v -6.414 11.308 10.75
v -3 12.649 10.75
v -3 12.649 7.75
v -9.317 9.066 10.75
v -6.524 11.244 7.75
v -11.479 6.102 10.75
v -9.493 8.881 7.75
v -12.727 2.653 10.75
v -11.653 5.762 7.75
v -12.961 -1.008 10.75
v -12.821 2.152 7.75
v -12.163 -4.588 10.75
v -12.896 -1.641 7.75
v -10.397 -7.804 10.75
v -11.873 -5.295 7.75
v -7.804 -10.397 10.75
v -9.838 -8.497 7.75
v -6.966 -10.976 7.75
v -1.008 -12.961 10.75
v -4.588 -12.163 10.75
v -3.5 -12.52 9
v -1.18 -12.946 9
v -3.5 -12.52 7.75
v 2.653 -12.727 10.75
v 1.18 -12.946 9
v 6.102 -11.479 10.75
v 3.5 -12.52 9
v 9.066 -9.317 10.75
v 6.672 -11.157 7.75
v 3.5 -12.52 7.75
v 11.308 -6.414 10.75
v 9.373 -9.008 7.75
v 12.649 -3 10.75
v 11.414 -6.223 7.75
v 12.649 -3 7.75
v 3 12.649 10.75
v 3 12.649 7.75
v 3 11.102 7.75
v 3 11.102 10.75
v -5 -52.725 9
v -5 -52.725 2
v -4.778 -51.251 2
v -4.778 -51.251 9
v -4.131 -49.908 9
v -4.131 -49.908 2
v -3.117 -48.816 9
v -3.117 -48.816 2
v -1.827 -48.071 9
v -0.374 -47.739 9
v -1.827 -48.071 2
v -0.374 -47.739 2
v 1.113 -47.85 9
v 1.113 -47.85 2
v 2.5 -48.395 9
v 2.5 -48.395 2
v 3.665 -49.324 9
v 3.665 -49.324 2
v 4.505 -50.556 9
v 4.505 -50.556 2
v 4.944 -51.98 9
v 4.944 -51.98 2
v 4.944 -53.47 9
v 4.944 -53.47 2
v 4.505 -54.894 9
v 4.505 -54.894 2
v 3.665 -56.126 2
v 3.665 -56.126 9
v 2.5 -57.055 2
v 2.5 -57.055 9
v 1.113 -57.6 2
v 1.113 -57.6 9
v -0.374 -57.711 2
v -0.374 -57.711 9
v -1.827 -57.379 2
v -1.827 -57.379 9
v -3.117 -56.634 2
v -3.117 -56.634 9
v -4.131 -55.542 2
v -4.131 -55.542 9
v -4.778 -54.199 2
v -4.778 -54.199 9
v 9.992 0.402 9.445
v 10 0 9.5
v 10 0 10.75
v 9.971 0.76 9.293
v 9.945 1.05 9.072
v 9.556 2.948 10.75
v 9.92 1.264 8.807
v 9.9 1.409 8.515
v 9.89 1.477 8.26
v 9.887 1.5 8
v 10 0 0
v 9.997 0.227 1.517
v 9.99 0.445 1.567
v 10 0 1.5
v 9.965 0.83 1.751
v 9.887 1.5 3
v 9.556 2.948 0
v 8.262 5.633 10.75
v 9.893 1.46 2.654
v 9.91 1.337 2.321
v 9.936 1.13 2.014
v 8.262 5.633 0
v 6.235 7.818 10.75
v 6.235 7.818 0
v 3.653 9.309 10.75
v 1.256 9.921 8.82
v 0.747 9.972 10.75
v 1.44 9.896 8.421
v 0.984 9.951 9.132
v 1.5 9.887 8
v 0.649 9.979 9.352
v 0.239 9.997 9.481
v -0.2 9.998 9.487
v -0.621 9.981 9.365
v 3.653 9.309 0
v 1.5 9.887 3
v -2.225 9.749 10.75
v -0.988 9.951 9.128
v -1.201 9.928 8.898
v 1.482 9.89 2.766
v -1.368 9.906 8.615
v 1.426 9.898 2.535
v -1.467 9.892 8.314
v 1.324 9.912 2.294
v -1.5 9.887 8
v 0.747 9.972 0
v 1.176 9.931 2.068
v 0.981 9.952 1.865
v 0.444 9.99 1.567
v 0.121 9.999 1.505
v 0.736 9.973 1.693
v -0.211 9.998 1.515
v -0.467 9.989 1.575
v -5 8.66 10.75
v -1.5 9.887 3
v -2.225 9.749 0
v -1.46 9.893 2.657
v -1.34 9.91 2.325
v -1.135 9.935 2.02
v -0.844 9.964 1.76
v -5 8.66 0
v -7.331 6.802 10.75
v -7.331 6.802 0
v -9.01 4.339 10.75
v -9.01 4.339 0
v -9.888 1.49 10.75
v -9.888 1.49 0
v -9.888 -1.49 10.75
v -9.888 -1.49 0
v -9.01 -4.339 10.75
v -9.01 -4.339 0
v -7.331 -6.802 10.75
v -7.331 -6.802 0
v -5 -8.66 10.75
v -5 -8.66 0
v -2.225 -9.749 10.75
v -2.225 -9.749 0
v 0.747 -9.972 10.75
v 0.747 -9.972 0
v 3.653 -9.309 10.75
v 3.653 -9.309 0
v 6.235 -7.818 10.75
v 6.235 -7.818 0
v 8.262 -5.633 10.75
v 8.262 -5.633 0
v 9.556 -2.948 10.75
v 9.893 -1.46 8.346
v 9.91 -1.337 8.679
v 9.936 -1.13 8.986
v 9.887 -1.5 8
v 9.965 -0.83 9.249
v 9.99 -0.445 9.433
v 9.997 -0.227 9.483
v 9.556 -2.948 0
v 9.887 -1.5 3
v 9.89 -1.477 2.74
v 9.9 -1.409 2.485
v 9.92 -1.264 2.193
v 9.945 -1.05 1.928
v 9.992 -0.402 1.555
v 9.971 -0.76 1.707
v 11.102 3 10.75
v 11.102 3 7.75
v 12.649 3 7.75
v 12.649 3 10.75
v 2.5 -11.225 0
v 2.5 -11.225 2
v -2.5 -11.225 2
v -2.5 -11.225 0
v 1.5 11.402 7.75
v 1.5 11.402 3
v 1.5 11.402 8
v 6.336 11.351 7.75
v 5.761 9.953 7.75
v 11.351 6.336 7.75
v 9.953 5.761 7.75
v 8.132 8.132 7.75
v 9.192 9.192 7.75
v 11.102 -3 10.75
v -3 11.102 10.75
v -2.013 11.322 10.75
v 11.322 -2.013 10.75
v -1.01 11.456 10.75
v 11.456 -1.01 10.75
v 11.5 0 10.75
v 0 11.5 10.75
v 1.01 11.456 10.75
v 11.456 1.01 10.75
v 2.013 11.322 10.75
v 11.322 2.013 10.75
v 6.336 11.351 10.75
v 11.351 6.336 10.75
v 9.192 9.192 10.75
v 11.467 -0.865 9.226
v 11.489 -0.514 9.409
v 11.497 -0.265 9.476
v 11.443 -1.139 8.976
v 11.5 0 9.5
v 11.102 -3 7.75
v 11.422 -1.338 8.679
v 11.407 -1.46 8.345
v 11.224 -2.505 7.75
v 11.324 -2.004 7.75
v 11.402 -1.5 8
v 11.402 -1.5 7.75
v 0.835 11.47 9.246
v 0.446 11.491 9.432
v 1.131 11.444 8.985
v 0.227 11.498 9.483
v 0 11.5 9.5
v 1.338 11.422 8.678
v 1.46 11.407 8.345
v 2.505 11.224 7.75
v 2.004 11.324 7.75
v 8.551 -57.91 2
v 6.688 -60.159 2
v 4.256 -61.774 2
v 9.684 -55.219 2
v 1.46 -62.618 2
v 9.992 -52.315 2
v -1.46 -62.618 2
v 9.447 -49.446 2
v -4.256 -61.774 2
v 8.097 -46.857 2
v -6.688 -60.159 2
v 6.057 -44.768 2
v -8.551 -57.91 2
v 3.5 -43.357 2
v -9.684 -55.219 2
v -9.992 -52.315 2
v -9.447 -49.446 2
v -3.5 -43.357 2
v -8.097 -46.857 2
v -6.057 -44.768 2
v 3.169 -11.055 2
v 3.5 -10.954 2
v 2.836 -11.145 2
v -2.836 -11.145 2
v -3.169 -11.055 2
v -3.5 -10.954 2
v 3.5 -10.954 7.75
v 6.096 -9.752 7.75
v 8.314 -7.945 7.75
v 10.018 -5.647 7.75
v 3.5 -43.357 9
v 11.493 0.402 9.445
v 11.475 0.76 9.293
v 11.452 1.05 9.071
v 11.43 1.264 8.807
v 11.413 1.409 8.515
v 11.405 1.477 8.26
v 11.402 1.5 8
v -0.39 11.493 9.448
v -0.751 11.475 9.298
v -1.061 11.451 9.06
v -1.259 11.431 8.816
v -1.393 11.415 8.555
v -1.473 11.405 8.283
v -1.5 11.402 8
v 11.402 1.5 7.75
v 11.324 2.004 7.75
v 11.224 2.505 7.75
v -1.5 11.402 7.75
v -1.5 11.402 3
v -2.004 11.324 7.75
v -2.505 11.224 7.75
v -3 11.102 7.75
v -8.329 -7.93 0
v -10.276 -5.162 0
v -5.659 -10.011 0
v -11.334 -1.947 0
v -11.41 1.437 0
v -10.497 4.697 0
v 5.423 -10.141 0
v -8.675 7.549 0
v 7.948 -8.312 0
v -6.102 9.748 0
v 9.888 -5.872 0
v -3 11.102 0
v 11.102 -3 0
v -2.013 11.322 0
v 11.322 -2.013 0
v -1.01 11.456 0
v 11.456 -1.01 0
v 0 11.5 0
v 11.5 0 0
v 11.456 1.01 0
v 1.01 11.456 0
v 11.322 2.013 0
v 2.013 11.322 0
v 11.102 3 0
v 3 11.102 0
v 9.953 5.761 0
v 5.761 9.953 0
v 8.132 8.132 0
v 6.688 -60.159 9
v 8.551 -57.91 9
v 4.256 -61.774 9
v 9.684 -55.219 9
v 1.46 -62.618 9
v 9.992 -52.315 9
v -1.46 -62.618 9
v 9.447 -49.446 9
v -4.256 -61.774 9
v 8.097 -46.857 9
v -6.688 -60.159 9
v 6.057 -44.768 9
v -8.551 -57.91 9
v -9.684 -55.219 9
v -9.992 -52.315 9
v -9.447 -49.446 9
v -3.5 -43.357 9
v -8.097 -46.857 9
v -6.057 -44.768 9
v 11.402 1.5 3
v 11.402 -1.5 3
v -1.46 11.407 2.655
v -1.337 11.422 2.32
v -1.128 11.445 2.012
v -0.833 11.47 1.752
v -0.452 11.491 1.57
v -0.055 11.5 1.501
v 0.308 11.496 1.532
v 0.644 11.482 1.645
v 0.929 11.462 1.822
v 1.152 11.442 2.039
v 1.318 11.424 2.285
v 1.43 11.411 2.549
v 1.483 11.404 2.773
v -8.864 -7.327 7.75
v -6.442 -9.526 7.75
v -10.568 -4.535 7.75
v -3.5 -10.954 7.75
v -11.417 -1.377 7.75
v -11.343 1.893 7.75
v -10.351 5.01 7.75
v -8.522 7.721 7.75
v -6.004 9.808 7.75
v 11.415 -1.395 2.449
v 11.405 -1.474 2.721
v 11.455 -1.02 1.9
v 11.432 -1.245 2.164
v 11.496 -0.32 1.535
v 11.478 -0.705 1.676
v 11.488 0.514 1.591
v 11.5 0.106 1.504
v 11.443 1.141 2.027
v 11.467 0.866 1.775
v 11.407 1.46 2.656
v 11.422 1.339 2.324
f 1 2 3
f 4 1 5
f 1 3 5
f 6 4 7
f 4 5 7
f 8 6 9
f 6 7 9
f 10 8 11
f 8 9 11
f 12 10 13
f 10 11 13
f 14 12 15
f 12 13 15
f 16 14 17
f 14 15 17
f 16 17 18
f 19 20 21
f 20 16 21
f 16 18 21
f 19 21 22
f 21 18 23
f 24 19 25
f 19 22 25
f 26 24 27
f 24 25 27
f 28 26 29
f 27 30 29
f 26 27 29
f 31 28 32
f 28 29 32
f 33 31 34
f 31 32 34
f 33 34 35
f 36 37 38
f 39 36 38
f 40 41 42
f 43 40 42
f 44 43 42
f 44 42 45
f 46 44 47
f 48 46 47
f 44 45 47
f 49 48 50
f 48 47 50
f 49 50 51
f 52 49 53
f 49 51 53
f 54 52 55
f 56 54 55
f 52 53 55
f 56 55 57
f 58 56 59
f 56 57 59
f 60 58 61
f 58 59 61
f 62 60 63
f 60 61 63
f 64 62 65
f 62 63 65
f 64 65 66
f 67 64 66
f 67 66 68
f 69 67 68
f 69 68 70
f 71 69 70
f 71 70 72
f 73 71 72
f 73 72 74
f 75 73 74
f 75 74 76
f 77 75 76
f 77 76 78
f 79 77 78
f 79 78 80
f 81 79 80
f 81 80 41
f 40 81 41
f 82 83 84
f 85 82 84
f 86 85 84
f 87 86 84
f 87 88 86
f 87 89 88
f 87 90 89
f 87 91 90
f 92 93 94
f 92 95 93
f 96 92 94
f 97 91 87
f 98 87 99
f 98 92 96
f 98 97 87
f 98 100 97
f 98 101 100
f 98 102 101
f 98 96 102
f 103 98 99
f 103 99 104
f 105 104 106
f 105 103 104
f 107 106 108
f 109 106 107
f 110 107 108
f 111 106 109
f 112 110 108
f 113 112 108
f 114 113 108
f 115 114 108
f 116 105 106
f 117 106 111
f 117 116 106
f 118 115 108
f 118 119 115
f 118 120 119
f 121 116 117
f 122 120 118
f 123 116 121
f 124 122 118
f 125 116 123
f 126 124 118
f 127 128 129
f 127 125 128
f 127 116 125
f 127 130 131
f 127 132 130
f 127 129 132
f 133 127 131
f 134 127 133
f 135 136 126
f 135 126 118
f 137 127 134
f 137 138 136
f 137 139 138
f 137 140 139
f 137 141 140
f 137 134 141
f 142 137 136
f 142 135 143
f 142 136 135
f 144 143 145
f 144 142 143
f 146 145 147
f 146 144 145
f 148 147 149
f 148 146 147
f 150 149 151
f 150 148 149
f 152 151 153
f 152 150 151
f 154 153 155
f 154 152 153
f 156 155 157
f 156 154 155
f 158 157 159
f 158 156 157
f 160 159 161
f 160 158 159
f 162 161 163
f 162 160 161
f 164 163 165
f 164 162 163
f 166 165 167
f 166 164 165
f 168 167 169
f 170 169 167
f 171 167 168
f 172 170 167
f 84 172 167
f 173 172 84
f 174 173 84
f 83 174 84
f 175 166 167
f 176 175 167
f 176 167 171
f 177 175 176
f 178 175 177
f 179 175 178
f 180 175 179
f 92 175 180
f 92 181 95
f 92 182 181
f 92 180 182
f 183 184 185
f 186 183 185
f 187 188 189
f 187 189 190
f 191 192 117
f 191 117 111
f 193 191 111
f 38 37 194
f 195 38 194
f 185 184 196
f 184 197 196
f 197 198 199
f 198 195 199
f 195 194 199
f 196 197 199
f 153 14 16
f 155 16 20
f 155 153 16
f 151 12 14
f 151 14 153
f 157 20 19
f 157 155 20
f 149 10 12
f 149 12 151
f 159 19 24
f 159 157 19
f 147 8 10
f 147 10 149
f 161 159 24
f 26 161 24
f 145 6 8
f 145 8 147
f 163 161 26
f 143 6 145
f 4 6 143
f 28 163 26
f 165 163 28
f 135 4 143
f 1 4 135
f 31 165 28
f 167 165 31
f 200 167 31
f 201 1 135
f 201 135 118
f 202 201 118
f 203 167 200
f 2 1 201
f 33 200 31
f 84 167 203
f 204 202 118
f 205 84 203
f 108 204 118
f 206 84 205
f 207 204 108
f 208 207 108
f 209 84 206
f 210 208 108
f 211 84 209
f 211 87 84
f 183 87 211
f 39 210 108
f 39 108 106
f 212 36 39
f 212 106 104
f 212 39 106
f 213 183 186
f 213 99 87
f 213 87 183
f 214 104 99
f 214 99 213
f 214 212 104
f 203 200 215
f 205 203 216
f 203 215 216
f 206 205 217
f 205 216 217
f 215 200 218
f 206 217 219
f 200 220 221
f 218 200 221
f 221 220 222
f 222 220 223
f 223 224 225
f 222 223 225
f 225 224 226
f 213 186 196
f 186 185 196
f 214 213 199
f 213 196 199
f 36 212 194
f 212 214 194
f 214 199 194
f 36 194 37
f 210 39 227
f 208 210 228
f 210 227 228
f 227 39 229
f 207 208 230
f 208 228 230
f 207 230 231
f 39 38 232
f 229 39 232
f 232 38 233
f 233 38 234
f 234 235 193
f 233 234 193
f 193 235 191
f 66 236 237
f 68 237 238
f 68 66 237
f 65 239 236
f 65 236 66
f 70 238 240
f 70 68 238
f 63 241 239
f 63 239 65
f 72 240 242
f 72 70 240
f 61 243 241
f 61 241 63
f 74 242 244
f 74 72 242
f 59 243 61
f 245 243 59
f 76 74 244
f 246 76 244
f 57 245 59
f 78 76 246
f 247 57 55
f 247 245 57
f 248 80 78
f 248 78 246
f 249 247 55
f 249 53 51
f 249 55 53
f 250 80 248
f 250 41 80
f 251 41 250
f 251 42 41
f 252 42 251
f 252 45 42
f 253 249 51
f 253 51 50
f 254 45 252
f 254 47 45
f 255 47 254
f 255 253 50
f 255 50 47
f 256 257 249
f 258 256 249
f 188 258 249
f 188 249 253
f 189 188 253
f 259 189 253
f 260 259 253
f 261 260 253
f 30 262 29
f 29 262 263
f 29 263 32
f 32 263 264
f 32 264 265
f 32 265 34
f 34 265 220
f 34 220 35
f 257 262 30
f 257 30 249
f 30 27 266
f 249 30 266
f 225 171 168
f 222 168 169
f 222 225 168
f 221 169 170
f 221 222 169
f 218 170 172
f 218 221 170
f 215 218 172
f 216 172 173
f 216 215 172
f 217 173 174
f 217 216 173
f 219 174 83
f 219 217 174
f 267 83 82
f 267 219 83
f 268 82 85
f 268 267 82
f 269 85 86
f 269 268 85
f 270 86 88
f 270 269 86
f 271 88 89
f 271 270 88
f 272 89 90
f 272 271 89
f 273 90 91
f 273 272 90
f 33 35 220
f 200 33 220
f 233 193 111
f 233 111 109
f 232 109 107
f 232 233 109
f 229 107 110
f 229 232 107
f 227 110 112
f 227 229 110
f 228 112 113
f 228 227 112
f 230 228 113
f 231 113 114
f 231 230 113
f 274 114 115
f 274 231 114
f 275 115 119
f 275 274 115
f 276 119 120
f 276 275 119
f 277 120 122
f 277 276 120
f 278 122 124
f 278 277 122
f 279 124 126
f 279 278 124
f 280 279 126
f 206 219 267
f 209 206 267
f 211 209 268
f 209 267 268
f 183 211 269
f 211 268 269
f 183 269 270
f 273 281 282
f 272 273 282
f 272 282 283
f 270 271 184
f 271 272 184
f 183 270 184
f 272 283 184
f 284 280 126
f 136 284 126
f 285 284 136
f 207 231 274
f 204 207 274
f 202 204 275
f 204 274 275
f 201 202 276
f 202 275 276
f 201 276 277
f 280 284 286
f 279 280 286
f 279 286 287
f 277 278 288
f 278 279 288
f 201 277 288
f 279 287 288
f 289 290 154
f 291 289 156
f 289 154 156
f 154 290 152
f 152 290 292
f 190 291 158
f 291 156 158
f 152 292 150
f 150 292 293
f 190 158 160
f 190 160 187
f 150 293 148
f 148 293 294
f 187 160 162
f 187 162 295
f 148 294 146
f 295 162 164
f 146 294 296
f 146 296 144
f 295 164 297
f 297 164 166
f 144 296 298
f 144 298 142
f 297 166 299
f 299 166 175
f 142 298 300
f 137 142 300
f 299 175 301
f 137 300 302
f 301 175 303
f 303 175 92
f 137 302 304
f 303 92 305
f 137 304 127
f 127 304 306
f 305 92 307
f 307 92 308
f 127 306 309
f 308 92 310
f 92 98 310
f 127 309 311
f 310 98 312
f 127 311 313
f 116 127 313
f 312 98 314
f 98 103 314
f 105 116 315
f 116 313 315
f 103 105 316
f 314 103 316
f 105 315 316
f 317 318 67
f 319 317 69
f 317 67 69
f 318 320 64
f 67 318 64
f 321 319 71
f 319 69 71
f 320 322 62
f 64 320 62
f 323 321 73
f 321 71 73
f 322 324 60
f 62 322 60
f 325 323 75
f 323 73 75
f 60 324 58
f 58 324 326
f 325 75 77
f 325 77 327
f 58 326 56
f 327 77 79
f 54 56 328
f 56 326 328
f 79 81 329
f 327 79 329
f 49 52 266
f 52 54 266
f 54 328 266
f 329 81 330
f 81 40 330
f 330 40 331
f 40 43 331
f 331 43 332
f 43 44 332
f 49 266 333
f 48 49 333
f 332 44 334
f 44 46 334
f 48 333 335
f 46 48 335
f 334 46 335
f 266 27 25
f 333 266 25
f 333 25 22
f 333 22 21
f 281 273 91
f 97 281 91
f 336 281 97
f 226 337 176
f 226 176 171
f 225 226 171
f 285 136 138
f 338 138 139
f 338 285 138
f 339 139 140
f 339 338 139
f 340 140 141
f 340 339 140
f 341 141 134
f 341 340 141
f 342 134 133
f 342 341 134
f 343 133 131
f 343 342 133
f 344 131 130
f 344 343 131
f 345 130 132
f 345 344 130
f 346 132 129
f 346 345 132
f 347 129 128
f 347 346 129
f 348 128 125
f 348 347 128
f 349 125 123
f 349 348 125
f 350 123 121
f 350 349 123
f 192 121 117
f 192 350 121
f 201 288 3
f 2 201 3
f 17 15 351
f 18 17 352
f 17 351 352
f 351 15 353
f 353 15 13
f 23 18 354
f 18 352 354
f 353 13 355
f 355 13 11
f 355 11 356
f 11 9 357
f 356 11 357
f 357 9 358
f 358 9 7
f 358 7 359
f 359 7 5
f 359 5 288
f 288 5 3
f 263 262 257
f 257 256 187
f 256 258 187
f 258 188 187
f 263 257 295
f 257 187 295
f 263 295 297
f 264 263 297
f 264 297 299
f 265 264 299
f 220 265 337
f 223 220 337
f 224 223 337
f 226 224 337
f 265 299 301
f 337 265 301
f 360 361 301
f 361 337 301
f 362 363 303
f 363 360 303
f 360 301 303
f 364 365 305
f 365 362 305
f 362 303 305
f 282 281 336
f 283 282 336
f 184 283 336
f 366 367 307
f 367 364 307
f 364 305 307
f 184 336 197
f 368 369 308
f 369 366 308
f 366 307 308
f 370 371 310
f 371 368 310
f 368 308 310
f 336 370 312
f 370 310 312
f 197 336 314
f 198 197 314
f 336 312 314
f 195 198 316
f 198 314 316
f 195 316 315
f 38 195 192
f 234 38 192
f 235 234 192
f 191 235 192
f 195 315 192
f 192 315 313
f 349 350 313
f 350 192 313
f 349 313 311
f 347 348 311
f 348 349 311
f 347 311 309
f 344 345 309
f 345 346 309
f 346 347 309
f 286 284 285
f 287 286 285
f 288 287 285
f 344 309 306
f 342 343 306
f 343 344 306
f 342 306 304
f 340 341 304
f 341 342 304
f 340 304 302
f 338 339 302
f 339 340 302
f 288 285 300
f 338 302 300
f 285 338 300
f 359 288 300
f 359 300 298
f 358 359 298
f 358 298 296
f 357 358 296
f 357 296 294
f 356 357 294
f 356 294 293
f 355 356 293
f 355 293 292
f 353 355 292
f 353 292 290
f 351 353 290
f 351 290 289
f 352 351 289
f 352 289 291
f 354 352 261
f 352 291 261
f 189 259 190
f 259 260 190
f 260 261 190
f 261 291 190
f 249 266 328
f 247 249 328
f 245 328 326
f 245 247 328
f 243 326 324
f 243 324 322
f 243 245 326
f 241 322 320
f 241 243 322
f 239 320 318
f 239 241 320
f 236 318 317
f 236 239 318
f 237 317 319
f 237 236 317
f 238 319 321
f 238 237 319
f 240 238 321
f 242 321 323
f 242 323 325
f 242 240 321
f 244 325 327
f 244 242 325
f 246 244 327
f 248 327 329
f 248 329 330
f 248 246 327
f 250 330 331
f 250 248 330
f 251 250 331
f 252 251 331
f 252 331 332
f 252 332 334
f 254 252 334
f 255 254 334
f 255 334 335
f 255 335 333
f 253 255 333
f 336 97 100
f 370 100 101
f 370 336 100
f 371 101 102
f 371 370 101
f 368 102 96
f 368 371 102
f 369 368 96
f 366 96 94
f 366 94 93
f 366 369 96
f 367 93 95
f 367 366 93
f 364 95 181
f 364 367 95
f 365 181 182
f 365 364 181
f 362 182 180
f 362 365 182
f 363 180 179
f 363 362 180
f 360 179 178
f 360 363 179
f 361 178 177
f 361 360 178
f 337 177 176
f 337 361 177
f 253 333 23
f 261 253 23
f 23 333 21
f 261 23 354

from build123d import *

# Parameters (mm, degrees)
CROQUIS1_R               = 10
SALIENTE_EXTRUIR1_DEPTH  = 3
CROQUIS2_R               = 11.5
CROQUIS2_R_2             = 10
SALIENTE_EXTRUIR3_DEPTH  = 8
SALIENTE_EXTRUIR4_START  = 3
CROQUIS3_R               = 11.5
CROQUIS3_R_2             = 10
SALIENTE_EXTRUIR4_DEPTH  = 3
CORTAR_EXTRUIR1_DEPTH    = 8
SALIENTE_EXTRUIR5_DEPTH  = 8
CORTAR_EXTRUIR2_DEPTH    = 8
CROQUIS11_W              = 0.560243
CROQUIS11_H              = 6
CORTAR_EXTRUIR3_DEPTH    = 8
CROQUIS12_W              = 2.5
CROQUIS12_H              = 0.622045
SALIENTE_EXTRUIR6_DEPTH  = 3
CROQUIS13_W              = 5
CROQUIS13_H              = 50.275028
SALIENTE_EXTRUIR7_DEPTH  = 8
CROQUIS15_W              = 2
CROQUIS15_H              = 50.275028
CORTAR_EXTRUIR4_DEPTH    = 8
SALIENTE_EXTRUIR8_DEPTH  = 7
CROQUIS21_R              = 10
SALIENTE_EXTRUIR9_DEPTH  = 7
CROQUIS22_R              = 5
CORTAR_EXTRUIR5_DEPTH    = 30
CROQUIS23_R              = 10
SALIENTE_EXTRUIR10_DEPTH = 1.25
CORTAR_EXTRUIR6_START    = -1.5
CROQUIS24_R              = 10
CORTAR_EXTRUIR6_DEPTH    = 1.5
SALIENTE_EXTRUIR11_START = -3
CROQUIS25_R              = 13
SALIENTE_EXTRUIR11_DEPTH = 3
CORTAR_EXTRUIR10_DEPTH   = 13
CORTAR_EXTRUIR11_DEPTH   = 13
CORTAR_EXTRUIR14_START   = -10
CROQUIS30_R              = 10
CORTAR_EXTRUIR14_DEPTH   = 10


with BuildPart() as part:
    # Croquis1 → Saliente-Extruir1 (new body)
    with BuildSketch(Plane.XY):
        Circle(CROQUIS1_R)
    extrude(amount=SALIENTE_EXTRUIR1_DEPTH)



with BuildPart() as body_2:
    # Croquis2 → Saliente-Extruir3 (new body)
    with BuildSketch(Plane.XY.offset(3)):
        Circle(CROQUIS2_R)
        Circle(CROQUIS2_R_2, mode=Mode.SUBTRACT)
    extrude(amount=SALIENTE_EXTRUIR3_DEPTH)


with BuildPart() as part_1:
    add(part.part)

    add(body_2.part)  # Saliente-Extruir4 merges body 2
    # Croquis3 → Saliente-Extruir4 (add)
    with BuildSketch(Plane(origin=(0, 0, 3), x_dir=(-1, 0, 0), z_dir=(0, 0, -1)).offset(SALIENTE_EXTRUIR4_START)):
        with Locations(Location((0, 0, 0), (0, 0, 180))):
            Circle(CROQUIS3_R)
        with Locations(Location((0, 0, 0), (0, 0, 180))):
            Circle(CROQUIS3_R_2, mode=Mode.SUBTRACT)
    extrude(amount=-SALIENTE_EXTRUIR4_DEPTH)

    # Croquis4 → Cortar-Extruir1 (cut)
    with BuildSketch(Plane(origin=(0, 11.5, 0), x_dir=(1, 0, 0), z_dir=(0, 1, 0))):
        with BuildLine():
            Line((-1.5, -8), (-1.5, -3))
            ThreePointArc((-1.5, -3), (0, -1.5), (1.5, -3))
            Line((1.5, -3), (1.5, -8))
            ThreePointArc((1.5, -8), (0, -9.5), (-1.5, -8))
        make_face()
    extrude(amount=-CORTAR_EXTRUIR1_DEPTH, mode=Mode.SUBTRACT)


with BuildPart() as body_2_2:
    # Croquis9 → Saliente-Extruir5 (new body)
    with BuildSketch(Plane.XY.offset(11)):
        Polygon((11.5, 0), (11.5, 3), (12.060243, 3), (12.060243, -3), (11.5, -3), align=None)
    extrude(amount=-SALIENTE_EXTRUIR5_DEPTH)


with BuildPart() as cortar_extruir2_tool:
    # Croquis10 → Cortar-Extruir2 (new body)
    with BuildSketch(Plane(origin=(12.060243, 0, 0), x_dir=(0, 0, -1), z_dir=(1, 0, 0))):
        with BuildLine():
            Line((-3, -1.5), (-8, -1.5))
            ThreePointArc((-8, -1.5), (-9.5, 0), (-8, 1.5))
            Line((-8, 1.5), (-3, 1.5))
            ThreePointArc((-3, 1.5), (-1.5, 0), (-3, -1.5))
        make_face()
    extrude(amount=-CORTAR_EXTRUIR2_DEPTH)


with BuildPart() as part_2:
    add(part_1.part)

    # Cortar-Extruir2: cut by cortar_extruir2_tool
    add(cortar_extruir2_tool.part, mode=Mode.SUBTRACT)

    # Croquis12 → Saliente-Extruir6 (add)
    with BuildSketch(Plane.XY.offset(3)):
        with Locations((-1.25, -11.188978)):
            Rectangle(CROQUIS12_W, CROQUIS12_H)
        with Locations((1.25, -11.188978)):
            Rectangle(CROQUIS12_W, CROQUIS12_H)
        Polygon((2.5, -11.5), (2.5, -61.5), (-2.5, -61.5), (-2.5, -11.5), (0, -11.5), align=None)
    extrude(amount=-SALIENTE_EXTRUIR6_DEPTH)

    # Croquis13 → Saliente-Extruir7 (add)
    with BuildSketch(Plane.XY.offset(3)):
        with Locations((0, -36.362486)):
            Rectangle(CROQUIS13_W, CROQUIS13_H)
    extrude(amount=SALIENTE_EXTRUIR7_DEPTH)

    # Croquis15 → Cortar-Extruir4 (cut)
    with BuildSketch(Plane(origin=(2.5, 0, 0), x_dir=(0, 0, -1), z_dir=(1, 0, 0))):
        with Locations((-10, -36.362486)):
            Rectangle(CROQUIS15_W, CROQUIS15_H)
        with Locations((-1, -36.362486)):
            Rectangle(CROQUIS15_W, CROQUIS15_H)
    extrude(amount=-CORTAR_EXTRUIR4_DEPTH, mode=Mode.SUBTRACT)

    # Croquis16 → Saliente-Extruir8 (add)
    with BuildSketch(Plane.XY.offset(9)):
        Polygon((-2.5, -61.5), (-3.5, -61.5), (-3.5, -10.232956), (3.5, -10.232956), (3.5, -61.5), (2.5, -61.5), align=None)
    extrude(amount=-SALIENTE_EXTRUIR8_DEPTH)

    # Croquis21 → Saliente-Extruir9 (add)
    with BuildSketch(Plane(origin=(0, 0, 2), x_dir=(-1, 0, 0), z_dir=(0, 0, -1))):
        with Locations((0, -52.724972)):
            Circle(CROQUIS21_R)
    extrude(amount=-SALIENTE_EXTRUIR9_DEPTH)

    # Croquis22 → Cortar-Extruir5 (cut)
    with BuildSketch(Plane(origin=(0, 0, 2), x_dir=(-1, 0, 0), z_dir=(0, 0, -1))):
        with Locations((0, -52.724972)):
            Circle(CROQUIS22_R)
    extrude(amount=-CORTAR_EXTRUIR5_DEPTH, mode=Mode.SUBTRACT)

    # Croquis23 → Saliente-Extruir10 (add)
    with BuildSketch(Plane.XY.offset(11)):
        with BuildLine():
            Line((-2.5, -11.224972), (2.5, -11.224972))
            ThreePointArc((2.5, -11.224972), (0, 11.5), (-2.5, -11.224972))
        make_face()
        with Locations(Location((0, 0, 0), (0, 0, 98.626927))):
            Circle(CROQUIS23_R, mode=Mode.SUBTRACT)
    extrude(amount=SALIENTE_EXTRUIR10_DEPTH)

    # Croquis24 → Cortar-Extruir6 (cut)
    with BuildSketch(Plane.XY.offset(12.25).offset(CORTAR_EXTRUIR6_START)):
        with BuildLine():
            Line((-2.5, -11.224972), (2.5, -11.224972))
            ThreePointArc((2.5, -11.224972), (0, 11.5), (-2.5, -11.224972))
        make_face()
        with Locations(Location((0, 0, 0), (0, 0, 98.626927))):
            Circle(CROQUIS24_R, mode=Mode.SUBTRACT)
    extrude(amount=CORTAR_EXTRUIR6_DEPTH, mode=Mode.SUBTRACT)

    # Croquis25 → Saliente-Extruir11 (add)
    with BuildSketch(Plane.XY.offset(10.75).offset(SALIENTE_EXTRUIR11_START)):
        Circle(CROQUIS25_R)
        with BuildLine():
            ThreePointArc((2.5, -11.224972), (0, 11.5), (-2.5, -11.224972))
            Line((-2.5, -11.224972), (2.5, -11.224972))
        make_face(mode=Mode.SUBTRACT)
    extrude(amount=SALIENTE_EXTRUIR11_DEPTH)

    # Croquis27 → Cortar-Extruir10 (cut)
    with BuildSketch(Plane(origin=(0, 0, 0), x_dir=(-1, 0, 0), z_dir=(0, 0, -1))):
        with BuildLine():
            ThreePointArc((-3, 11.101802), (-1.513156, 11.400016), (0, 11.5))
            Line((0, 11.5), (-3, 11.5))
            Line((-3, 11.5), (-3, 11.369881))
            Line((-3, 11.369881), (-3, 11.101802))
        make_face()
        with BuildLine():
            Line((3, 11.369881), (3, 11.5))
            Line((3, 11.5), (0, 11.5))
            ThreePointArc((0, 11.5), (1.513156, 11.400016), (3, 11.101802))
            Line((3, 11.101802), (3, 11.369881))
        make_face()
        Polygon((0, 11.5), (3, 11.5), (3, 12.649111), (3, 13.586373), (-0.001501, 13.586373), (-3, 13.586373), (-3, 11.5), align=None)
    extrude(amount=-CORTAR_EXTRUIR10_DEPTH, mode=Mode.SUBTRACT)

    # Croquis28 → Cortar-Extruir11 (cut)
    with BuildSketch(Plane(origin=(0, 0, 0), x_dir=(-1, 0, 0), z_dir=(0, 0, -1))):
        Polygon((-13.802598, 3), (-11.5, 3), (-11.5, 0), (-11.5, -3), (-13.802598, -3), align=None)
        with BuildLine():
            Line((-11.5, 3), (-11.5, 0))
            ThreePointArc((-11.5, 0), (-11.400016, 1.513156), (-11.101802, 3))
            Line((-11.101802, 3), (-11.5, 3))
        make_face()
        with BuildLine():
            ThreePointArc((-11.101802, -3), (-11.400016, -1.513156), (-11.5, 0))
            Line((-11.5, 0), (-11.5, -3))
            Line((-11.5, -3), (-11.101802, -3))
        make_face()
    extrude(amount=-CORTAR_EXTRUIR11_DEPTH, mode=Mode.SUBTRACT)

    # Croquis30 → Cortar-Extruir14 (cut)
    with BuildSketch(Plane.XY.offset(3).offset(CORTAR_EXTRUIR14_START)):
        Circle(CROQUIS30_R)
    extrude(amount=CORTAR_EXTRUIR14_DEPTH, mode=Mode.SUBTRACT)


with BuildPart() as body_2_2_1:
    add(body_2_2.part)

    # Cortar-Extruir2: cut by cortar_extruir2_tool
    add(cortar_extruir2_tool.part, mode=Mode.SUBTRACT)

    # Croquis11 → Cortar-Extruir3 (cut)
    with BuildSketch(Plane.XY.offset(11)):
        with Locations((11.780121, 0)):
            Rectangle(CROQUIS11_W, CROQUIS11_H)
    extrude(amount=-CORTAR_EXTRUIR3_DEPTH, mode=Mode.SUBTRACT)


solid = part_2.part
